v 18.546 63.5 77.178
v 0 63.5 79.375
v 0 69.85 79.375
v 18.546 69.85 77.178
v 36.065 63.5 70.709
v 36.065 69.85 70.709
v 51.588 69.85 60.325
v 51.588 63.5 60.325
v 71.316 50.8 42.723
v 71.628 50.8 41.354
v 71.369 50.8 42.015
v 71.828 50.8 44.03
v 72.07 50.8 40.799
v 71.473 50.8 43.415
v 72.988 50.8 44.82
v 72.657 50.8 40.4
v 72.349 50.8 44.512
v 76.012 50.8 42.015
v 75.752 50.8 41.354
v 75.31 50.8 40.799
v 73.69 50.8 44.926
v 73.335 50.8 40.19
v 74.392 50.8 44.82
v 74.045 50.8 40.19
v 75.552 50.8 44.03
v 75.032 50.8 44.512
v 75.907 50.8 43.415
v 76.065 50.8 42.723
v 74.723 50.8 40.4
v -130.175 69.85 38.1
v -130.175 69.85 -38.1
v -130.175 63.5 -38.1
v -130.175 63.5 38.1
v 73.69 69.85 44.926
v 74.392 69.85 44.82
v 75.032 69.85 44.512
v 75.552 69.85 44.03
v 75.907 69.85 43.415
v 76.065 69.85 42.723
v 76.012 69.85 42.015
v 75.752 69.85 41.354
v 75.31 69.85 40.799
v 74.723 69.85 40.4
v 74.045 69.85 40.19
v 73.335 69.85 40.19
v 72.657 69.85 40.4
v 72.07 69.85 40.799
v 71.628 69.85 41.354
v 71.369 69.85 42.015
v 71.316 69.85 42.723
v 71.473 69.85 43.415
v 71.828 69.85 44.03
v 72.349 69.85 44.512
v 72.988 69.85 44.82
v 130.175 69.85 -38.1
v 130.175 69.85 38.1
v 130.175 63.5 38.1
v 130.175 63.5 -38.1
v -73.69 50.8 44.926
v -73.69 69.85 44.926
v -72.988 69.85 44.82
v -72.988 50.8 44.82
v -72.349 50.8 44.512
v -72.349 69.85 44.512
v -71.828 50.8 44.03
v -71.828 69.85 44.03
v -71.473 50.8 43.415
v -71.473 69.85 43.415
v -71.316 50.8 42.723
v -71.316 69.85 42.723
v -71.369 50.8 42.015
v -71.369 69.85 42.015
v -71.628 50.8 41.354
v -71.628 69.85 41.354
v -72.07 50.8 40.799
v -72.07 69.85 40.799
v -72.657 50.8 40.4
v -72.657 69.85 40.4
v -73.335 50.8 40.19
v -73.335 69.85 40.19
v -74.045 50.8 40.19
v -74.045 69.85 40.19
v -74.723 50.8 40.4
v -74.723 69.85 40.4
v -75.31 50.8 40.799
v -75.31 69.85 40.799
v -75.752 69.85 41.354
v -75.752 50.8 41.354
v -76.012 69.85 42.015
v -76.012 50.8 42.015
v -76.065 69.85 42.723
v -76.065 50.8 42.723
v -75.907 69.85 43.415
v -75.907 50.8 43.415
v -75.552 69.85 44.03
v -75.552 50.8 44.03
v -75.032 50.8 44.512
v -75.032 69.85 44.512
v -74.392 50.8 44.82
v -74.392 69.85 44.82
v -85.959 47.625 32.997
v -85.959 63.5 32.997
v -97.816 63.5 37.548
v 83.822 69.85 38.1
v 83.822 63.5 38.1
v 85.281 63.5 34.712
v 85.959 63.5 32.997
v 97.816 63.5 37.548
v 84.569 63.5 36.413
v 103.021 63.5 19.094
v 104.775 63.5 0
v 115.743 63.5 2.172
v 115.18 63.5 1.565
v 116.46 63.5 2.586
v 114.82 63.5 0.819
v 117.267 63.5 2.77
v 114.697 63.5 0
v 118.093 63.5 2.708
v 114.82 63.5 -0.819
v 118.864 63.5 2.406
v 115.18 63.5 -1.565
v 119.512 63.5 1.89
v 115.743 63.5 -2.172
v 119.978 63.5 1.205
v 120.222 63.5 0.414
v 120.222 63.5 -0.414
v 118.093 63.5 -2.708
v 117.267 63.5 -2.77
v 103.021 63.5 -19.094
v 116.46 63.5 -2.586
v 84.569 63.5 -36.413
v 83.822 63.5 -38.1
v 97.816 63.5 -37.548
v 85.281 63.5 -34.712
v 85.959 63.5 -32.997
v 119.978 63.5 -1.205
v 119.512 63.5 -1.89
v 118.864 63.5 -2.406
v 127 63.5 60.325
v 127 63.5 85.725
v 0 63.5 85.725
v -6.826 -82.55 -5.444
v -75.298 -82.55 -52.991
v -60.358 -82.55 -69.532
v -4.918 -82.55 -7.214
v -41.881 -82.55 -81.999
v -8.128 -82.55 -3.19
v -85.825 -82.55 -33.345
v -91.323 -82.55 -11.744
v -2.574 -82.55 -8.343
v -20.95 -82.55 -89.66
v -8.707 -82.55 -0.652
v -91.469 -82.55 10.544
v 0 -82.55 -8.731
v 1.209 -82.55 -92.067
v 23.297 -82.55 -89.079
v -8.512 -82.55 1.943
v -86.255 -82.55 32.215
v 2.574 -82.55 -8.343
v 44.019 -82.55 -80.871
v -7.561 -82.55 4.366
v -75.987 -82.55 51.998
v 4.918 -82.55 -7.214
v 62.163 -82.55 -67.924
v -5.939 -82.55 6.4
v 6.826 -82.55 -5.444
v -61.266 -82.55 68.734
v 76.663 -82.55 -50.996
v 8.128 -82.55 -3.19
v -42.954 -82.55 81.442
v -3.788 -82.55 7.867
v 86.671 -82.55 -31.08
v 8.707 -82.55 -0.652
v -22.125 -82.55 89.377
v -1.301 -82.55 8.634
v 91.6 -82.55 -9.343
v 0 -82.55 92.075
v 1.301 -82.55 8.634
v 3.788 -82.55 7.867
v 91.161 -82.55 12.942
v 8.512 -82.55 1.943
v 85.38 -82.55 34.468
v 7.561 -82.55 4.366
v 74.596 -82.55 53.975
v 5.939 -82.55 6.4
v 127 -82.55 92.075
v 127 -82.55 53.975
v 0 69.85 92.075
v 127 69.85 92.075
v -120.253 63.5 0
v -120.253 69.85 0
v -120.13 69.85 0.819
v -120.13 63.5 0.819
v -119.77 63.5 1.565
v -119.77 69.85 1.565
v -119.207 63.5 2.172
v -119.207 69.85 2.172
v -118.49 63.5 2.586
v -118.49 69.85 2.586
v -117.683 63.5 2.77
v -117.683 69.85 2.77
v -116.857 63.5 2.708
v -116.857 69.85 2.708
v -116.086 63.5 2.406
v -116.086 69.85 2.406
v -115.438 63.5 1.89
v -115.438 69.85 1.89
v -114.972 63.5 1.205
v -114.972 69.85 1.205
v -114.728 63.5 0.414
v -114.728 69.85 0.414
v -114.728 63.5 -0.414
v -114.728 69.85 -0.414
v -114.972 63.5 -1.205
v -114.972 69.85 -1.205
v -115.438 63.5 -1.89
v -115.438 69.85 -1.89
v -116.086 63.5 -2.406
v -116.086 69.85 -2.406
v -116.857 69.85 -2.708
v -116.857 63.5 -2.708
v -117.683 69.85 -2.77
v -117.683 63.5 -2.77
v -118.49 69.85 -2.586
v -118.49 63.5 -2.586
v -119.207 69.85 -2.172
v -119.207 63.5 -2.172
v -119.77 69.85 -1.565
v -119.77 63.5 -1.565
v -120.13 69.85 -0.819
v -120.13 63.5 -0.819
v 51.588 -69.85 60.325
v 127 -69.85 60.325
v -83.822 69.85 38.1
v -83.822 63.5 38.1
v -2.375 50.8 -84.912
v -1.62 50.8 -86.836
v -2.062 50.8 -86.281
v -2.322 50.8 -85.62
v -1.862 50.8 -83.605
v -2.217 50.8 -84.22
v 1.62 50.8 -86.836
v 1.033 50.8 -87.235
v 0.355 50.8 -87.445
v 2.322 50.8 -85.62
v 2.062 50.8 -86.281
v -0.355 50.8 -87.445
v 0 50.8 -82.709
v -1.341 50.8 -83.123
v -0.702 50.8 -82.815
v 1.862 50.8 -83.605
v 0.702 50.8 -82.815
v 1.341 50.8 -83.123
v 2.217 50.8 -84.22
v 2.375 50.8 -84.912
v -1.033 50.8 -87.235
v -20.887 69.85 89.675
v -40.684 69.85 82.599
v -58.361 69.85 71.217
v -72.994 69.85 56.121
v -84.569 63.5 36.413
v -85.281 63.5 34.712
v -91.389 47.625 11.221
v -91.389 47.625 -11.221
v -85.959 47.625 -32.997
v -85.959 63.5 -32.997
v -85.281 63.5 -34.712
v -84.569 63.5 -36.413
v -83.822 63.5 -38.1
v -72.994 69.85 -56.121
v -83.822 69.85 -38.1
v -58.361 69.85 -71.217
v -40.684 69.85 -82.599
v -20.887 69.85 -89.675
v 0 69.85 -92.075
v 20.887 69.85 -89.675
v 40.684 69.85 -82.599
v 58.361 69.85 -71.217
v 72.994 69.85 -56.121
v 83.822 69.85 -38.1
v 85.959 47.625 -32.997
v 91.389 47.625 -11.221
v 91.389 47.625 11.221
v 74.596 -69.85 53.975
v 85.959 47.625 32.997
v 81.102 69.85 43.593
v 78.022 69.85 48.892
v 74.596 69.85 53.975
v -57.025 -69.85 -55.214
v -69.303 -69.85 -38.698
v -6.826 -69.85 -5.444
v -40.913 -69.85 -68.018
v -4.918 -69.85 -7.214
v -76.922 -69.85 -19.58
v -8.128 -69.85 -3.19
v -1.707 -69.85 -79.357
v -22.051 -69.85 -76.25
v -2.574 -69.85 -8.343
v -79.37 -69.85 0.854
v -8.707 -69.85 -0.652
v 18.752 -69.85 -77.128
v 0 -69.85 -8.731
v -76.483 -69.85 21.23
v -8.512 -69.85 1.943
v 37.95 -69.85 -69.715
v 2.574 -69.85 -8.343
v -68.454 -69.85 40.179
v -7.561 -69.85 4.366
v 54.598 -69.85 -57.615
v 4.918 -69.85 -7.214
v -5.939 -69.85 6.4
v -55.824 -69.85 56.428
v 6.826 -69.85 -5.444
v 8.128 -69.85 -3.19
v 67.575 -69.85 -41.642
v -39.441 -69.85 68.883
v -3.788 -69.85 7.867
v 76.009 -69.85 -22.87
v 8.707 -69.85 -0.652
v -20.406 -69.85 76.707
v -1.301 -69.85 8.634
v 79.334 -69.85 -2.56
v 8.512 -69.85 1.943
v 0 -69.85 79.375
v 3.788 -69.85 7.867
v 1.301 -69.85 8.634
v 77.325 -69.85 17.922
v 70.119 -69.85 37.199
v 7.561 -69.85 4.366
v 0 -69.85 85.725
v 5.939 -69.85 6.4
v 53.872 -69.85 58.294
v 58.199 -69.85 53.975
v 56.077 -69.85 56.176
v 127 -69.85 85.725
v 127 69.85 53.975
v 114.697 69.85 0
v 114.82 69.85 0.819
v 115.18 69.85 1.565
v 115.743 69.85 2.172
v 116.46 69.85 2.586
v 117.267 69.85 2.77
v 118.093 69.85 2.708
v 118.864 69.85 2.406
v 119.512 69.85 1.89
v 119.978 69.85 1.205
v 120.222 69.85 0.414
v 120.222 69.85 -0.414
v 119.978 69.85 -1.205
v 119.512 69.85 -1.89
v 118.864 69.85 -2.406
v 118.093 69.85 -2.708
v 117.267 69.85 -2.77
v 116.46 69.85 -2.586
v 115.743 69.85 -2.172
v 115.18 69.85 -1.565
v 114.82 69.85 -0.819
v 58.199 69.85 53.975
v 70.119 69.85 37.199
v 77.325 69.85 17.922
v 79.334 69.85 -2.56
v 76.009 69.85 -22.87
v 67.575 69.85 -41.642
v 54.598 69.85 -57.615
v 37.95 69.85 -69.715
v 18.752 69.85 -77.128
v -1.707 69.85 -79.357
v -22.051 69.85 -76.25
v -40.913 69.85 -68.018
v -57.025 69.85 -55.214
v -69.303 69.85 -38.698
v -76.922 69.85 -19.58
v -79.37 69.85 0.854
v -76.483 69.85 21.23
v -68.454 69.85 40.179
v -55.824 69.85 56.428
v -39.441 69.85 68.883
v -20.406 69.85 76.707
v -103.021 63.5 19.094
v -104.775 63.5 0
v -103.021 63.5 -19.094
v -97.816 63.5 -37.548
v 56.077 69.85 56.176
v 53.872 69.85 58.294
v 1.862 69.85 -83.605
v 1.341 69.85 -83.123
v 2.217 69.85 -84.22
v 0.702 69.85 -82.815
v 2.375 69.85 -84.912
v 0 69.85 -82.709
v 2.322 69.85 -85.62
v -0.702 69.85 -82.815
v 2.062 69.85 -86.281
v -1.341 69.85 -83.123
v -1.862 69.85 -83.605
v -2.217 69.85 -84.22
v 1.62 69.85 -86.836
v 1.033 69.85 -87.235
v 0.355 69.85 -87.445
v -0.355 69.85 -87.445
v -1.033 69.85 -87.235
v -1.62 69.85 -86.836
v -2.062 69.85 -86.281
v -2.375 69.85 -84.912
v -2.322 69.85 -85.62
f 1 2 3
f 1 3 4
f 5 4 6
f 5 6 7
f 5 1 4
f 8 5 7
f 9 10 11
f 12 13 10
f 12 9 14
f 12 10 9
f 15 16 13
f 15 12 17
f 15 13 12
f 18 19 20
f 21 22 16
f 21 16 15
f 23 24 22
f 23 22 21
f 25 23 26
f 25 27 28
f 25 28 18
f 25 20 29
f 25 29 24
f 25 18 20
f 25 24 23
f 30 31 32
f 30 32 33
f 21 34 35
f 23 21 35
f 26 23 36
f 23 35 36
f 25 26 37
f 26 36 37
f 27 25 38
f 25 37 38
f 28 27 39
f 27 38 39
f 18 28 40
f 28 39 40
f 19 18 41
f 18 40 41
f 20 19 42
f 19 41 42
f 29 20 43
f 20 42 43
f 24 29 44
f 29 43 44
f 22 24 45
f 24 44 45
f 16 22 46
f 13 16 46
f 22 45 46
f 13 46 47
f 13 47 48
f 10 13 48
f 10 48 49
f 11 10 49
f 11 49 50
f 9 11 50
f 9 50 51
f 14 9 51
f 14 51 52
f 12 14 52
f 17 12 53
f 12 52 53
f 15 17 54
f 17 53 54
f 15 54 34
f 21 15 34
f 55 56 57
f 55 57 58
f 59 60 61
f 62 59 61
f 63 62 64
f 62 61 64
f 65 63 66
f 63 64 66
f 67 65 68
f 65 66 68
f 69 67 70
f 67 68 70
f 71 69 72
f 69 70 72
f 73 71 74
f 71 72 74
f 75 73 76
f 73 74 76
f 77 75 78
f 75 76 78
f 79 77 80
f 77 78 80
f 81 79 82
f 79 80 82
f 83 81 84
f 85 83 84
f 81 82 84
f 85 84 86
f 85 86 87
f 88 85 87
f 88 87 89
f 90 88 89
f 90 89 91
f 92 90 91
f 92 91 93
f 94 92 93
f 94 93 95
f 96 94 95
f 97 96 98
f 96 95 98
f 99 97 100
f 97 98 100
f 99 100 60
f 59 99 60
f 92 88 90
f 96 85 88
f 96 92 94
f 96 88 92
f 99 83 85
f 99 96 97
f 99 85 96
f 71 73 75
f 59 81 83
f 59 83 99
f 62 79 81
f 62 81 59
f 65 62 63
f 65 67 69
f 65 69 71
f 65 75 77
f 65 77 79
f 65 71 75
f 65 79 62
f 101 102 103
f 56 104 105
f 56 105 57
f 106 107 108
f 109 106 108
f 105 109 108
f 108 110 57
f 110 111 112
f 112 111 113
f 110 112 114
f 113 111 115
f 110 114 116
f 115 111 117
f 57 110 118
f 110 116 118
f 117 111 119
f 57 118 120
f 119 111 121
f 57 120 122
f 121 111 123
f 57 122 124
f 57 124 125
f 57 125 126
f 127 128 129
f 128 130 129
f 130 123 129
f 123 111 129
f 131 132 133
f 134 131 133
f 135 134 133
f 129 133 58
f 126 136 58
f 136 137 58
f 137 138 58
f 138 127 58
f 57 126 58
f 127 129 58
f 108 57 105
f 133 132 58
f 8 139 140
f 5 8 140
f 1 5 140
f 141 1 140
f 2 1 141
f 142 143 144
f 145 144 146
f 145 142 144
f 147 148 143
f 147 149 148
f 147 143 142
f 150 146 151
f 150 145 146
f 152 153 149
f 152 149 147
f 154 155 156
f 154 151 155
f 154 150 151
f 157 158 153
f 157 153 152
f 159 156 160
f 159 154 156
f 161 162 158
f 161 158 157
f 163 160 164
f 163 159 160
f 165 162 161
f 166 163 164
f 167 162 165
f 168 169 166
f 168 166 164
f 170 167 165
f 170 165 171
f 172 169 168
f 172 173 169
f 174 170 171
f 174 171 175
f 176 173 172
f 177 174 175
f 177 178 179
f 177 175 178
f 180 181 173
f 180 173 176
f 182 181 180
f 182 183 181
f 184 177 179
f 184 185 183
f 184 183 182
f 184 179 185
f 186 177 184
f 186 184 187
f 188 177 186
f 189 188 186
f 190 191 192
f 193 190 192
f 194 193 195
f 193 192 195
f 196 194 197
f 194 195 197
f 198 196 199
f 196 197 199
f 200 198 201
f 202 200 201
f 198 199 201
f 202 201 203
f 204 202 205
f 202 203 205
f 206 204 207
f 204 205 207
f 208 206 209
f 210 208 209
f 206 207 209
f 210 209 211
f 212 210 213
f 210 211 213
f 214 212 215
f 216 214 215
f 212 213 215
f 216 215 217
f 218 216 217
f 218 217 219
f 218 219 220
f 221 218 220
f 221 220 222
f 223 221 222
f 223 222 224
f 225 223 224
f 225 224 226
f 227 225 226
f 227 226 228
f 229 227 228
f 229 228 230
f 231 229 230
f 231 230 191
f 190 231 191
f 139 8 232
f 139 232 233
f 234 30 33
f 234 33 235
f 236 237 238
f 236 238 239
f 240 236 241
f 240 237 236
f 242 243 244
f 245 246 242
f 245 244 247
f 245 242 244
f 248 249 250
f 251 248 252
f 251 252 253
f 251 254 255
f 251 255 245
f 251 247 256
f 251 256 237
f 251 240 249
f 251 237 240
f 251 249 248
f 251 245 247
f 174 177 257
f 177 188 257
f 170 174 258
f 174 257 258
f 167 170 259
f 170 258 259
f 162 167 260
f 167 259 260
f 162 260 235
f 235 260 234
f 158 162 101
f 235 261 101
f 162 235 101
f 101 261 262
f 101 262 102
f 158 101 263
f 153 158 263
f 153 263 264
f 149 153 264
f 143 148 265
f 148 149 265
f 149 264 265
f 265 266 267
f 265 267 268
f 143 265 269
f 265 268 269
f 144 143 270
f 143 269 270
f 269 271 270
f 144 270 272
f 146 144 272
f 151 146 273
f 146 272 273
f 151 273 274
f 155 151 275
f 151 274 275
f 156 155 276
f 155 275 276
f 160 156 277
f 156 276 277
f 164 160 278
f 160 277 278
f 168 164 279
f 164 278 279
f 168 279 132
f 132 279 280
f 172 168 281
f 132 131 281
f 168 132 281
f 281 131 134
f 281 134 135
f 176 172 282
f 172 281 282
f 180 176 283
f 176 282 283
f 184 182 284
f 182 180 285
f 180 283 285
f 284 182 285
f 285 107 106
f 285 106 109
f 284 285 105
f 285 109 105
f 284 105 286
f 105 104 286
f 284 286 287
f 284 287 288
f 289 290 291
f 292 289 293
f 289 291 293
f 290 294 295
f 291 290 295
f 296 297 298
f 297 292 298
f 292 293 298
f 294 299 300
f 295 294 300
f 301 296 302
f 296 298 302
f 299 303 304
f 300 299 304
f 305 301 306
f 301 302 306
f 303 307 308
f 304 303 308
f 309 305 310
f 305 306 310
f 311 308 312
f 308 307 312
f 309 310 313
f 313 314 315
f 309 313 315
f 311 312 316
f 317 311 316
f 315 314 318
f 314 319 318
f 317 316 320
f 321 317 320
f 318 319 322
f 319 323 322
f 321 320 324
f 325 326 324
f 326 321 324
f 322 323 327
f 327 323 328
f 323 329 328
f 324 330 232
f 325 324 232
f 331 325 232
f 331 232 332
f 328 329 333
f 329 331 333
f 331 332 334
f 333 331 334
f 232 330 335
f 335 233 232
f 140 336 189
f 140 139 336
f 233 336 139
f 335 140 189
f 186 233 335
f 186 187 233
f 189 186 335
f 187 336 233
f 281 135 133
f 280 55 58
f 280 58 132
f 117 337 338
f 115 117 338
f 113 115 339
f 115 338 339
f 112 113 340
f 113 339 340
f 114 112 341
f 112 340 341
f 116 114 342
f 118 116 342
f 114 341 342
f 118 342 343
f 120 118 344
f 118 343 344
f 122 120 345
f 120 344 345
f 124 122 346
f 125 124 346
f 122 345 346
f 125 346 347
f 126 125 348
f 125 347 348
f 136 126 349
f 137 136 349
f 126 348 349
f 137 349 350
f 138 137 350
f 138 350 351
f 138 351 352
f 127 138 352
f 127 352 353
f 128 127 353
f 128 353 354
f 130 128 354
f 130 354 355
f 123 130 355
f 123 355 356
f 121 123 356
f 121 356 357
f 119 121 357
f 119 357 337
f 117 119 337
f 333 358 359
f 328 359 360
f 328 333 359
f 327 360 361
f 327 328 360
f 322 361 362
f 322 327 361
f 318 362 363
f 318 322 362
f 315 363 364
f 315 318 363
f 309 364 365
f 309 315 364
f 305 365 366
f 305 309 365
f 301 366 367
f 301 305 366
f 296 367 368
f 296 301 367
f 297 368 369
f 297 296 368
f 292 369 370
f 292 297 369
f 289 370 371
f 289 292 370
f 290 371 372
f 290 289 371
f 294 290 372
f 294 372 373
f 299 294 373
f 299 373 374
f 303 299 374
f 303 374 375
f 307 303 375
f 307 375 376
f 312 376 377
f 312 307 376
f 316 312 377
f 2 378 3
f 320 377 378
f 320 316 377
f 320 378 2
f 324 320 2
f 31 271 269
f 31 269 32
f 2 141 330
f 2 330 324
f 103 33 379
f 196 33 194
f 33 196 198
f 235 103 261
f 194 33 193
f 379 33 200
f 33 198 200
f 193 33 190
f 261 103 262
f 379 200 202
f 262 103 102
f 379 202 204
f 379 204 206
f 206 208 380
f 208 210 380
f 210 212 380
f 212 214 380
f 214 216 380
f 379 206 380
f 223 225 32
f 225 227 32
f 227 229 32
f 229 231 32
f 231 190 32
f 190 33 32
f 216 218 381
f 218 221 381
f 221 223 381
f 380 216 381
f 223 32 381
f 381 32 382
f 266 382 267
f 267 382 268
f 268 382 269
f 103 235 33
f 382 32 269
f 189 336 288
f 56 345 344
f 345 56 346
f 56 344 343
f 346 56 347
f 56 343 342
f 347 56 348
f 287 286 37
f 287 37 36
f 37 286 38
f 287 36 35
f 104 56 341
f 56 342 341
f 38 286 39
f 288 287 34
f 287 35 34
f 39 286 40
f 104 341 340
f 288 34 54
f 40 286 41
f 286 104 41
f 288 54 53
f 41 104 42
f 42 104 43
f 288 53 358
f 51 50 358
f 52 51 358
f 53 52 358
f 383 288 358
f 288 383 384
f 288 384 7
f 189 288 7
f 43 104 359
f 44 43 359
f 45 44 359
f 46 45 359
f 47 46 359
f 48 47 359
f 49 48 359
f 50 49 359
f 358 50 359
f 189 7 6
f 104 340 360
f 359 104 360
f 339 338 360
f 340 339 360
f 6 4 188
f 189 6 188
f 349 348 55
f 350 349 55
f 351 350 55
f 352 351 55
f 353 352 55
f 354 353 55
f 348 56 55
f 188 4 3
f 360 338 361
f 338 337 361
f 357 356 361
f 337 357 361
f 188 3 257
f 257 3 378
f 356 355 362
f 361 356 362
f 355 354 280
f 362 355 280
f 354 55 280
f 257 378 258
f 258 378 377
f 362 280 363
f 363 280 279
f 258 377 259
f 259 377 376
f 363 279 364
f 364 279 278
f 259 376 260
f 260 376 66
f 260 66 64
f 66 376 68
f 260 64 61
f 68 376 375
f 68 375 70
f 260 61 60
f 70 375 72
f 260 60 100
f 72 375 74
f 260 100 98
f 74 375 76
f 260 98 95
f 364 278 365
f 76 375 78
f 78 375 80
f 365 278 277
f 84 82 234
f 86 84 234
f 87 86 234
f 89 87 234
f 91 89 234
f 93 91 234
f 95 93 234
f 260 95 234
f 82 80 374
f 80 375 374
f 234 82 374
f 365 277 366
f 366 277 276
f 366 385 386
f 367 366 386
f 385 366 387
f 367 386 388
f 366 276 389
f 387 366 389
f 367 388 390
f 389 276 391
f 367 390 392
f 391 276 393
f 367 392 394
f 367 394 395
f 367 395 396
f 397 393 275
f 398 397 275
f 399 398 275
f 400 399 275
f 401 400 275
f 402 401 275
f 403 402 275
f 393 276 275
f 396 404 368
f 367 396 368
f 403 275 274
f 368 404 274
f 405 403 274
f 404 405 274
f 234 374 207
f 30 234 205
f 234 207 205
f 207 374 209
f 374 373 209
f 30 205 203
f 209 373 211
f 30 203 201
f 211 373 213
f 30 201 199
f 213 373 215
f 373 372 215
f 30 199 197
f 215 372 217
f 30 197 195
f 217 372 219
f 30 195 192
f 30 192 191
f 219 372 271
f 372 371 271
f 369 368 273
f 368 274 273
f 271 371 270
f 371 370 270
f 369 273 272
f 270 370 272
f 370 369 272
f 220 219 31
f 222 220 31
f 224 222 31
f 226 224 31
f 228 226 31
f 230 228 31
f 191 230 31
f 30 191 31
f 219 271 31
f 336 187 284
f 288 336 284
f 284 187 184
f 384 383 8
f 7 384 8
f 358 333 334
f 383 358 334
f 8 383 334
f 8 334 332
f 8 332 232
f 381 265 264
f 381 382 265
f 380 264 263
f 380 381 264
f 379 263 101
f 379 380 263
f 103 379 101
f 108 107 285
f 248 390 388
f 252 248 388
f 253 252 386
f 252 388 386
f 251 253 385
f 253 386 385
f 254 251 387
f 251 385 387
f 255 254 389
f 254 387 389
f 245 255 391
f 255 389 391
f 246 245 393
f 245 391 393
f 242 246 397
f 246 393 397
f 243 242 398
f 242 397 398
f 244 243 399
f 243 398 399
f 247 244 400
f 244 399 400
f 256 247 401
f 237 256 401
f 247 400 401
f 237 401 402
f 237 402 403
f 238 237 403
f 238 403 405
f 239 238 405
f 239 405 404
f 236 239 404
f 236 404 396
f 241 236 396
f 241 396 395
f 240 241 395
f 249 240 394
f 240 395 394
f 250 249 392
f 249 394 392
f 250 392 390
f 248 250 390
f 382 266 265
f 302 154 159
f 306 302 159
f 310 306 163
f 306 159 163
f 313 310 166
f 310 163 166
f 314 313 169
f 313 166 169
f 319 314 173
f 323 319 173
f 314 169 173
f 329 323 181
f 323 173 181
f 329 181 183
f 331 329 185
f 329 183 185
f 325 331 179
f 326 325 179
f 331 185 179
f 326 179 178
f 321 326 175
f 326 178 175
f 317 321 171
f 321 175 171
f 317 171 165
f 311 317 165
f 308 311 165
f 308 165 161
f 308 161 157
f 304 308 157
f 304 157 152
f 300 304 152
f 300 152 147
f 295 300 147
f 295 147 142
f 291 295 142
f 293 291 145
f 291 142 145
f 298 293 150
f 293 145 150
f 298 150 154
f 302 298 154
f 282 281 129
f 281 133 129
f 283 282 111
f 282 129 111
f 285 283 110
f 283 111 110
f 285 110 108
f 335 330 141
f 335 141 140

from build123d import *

# Parameters (mm, degrees)
SKETCH1_R                = 92.075
SKETCH1_R_2              = 79.375
BOSS_EXTRUDE1_DEPTH      = 69.85
SKETCH2_R                = 92.075
BOSS_EXTRUDE2_DEPTH      = 12.7
SKETCH3_R                = 8.73125
CUT_EXTRUDE1_DEPTH       = 12.7
SKETCH4_R                = 2.38125
CUT_EXTRUDE2_DEPTH       = 19.05
BOSS_EXTRUDE3_START      = -12.7
BOSS_EXTRUDE3_DEPTH      = 12.7
SKETCH7_W                = 127
SKETCH7_H                = 38.1
CUT_EXTRUDE4_DEPTH       = 139.7
SKETCH8_W                = 127
SKETCH8_H                = 6.35
BOSS_EXTRUDE4_DEPTH      = 139.7
BOSS_EXTRUDE5_DEPTH      = 139.7
BOSS_EXTRUDE6_START      = -6.35
BOSS_EXTRUDE6_DEPTH      = 6.35
BOSS_EXTRUDE7_DEPTH      = 6.35
REVOLVE1_ANGLE           = 21
REVOLVE1_OTHER_WAY_ANGLE = 21
SKETCH14_R               = 2.778125
CUT_EXTRUDE5_DEPTH       = 9.525


with BuildPart() as part:
    # Sketch1 → Boss-Extrude1 (new, symmetric)
    with BuildSketch(Plane(origin=(0, 0, 0), x_dir=(1, 0, 0), z_dir=(0, 1, 0))):
        with Locations(Location((0, 0, 0), (0, 0, 270))):
            Circle(SKETCH1_R)
        with Locations(Location((0, 0, 0), (0, 0, 270))):
            Circle(SKETCH1_R_2, mode=Mode.SUBTRACT)
    extrude(amount=BOSS_EXTRUDE1_DEPTH, both=True)

    # Sketch2 → Boss-Extrude2 (add)
    with BuildSketch(Plane.XZ.offset(69.85)):
        with Locations(Location((0, 0, 0), (0, 0, 270))):
            Circle(SKETCH2_R)
    extrude(amount=BOSS_EXTRUDE2_DEPTH)

    # Sketch3 → Cut-Extrude1 (cut)
    with BuildSketch(Plane.XZ.offset(82.55)):
        with Locations(Location((0, 0, 0), (0, 0, 270))):
            Circle(SKETCH3_R)
    extrude(amount=-CUT_EXTRUDE1_DEPTH, mode=Mode.SUBTRACT)

    # Sketch4 → Cut-Extrude2 (cut)
    with BuildSketch(Plane(origin=(0, 69.85, 0), x_dir=(1, 0, 0), z_dir=(0, 1, 0))):
        with Locations(Location((0, 85.09, 0), (0, 0, 270))):
            Circle(SKETCH4_R)
        with Locations(Location((73.690101608, -42.545, 0), (0, 0, 270))):
            Circle(SKETCH4_R)
        with Locations(Location((-73.690101608, -42.545, 0), (0, 0, 270))):
            Circle(SKETCH4_R)
    extrude(amount=-CUT_EXTRUDE2_DEPTH, mode=Mode.SUBTRACT)

    # Sketch6 → Boss-Extrude3 (add)
    with BuildSketch(Plane.XZ.offset(82.55).offset(BOSS_EXTRUDE3_START)):
        with BuildLine():
            Line((127, 92.075), (0, 92.075))
            ThreePointArc((0, 92.075), (41.881126418, 81.99863947), (74.59560979, 53.975))
            Line((74.59560979, 53.975), (127, 53.975))
            Line((127, 53.975), (127, 92.075))
        make_face()
    extrude(amount=BOSS_EXTRUDE3_DEPTH)

    # Sketch7 → Cut-Extrude4 (cut)
    with BuildSketch(Plane(origin=(0, 69.85, 0), x_dir=(1, 0, 0), z_dir=(0, 1, 0))):
        with Locations((63.5, -73.025)):
            Rectangle(SKETCH7_W, SKETCH7_H)
    extrude(amount=-CUT_EXTRUDE4_DEPTH, mode=Mode.SUBTRACT)

    # Sketch8 → Boss-Extrude4 (add)
    with BuildSketch(Plane(origin=(0, -69.85, 0), x_dir=(1, 0, 0), z_dir=(0, 1, 0))):
        with Locations((63.5, -88.9)):
            Rectangle(SKETCH8_W, SKETCH8_H)
    extrude(amount=BOSS_EXTRUDE4_DEPTH)

    # Sketch9 → Boss-Extrude5 (add)
    with BuildSketch(Plane(origin=(0, -69.85, 0), x_dir=(1, 0, 0), z_dir=(0, 1, 0))):
        with BuildLine():
            Line((127, -53.975), (58.198711326, -53.975))
            ThreePointArc((58.198711326, -53.975), (54.984921313, -57.245515573), (51.587643869, -60.325))
            Line((51.587643869, -60.325), (127, -60.325))
            Line((127, -60.325), (127, -53.975))
        make_face()
    extrude(amount=BOSS_EXTRUDE5_DEPTH)

    # Sketch10 → Boss-Extrude6 (add)
    with BuildSketch(Plane(origin=(0, 69.85, 0), x_dir=(1, 0, 0), z_dir=(0, 1, 0)).offset(BOSS_EXTRUDE6_START)):
        with BuildLine():
            ThreePointArc((0, -79.375), (27.49630657, -74.460350187), (51.587643869, -60.325))
            Line((51.587643869, -60.325), (127, -60.325))
            Line((127, -60.325), (127, -85.725))
            Line((127, -85.725), (0, -85.725))
            Line((0, -85.725), (0, -79.375))
        make_face()
    extrude(amount=BOSS_EXTRUDE6_DEPTH)

    # Sketch11 → Boss-Extrude7 (add)
    with BuildSketch(Plane(origin=(0, 69.85, 0), x_dir=(1, 0, 0), z_dir=(0, 1, 0))):
        with BuildLine():
            ThreePointArc((-83.822405269, -38.1), (-92.075, 0), (-83.822405269, 38.1))
            Line((-83.822405269, 38.1), (-130.175, 38.1))
            Line((-130.175, 38.1), (-130.175, -38.1))
            Line((-130.175, -38.1), (-83.822405269, -38.1))
        make_face()
        with BuildLine():
            Line((83.822405269, -38.1), (130.175, -38.1))
            Line((130.175, -38.1), (130.175, 38.1))
            Line((130.175, 38.1), (83.822405269, 38.1))
            ThreePointArc((83.822405269, 38.1), (92.075, 0), (83.822405269, -38.1))
        make_face()
    extrude(amount=-BOSS_EXTRUDE7_DEPTH)

    # Sketch13 → Revolve1 (revolve)
    with BuildSketch(Plane.XY):
        Polygon((92.075, 63.5), (92.075, 47.625), (104.775, 63.5), align=None)
        Polygon((-92.075, 63.5), (-92.075, 47.625), (-104.775, 63.5), align=None)
    revolve(axis=Axis((0, -102.398385613, 0), (0, 1, 0)), revolution_arc=REVOLVE1_ANGLE)

    # Sketch13 → Revolve1 other way (revolve)
    with BuildSketch(Plane.XY):
        Polygon((92.075, 63.5), (92.075, 47.625), (104.775, 63.5), align=None)
        Polygon((-92.075, 63.5), (-92.075, 47.625), (-104.775, 63.5), align=None)
    revolve(axis=Axis((0, -102.398385613, 0), (0, -1, 0)), revolution_arc=REVOLVE1_OTHER_WAY_ANGLE)

    # Sketch14 → Cut-Extrude5 (cut)
    with BuildSketch(Plane(origin=(0, 69.85, 0), x_dir=(1, 0, 0), z_dir=(0, 1, 0))):
        with Locations(Location((-117.475, 0, 0), (0, 0, 180))):
            Circle(SKETCH14_R)
        with Locations(Location((117.475, 0, 0), (0, 0, 180))):
            Circle(SKETCH14_R)
    extrude(amount=-CUT_EXTRUDE5_DEPTH, mode=Mode.SUBTRACT)


solid = part.part
